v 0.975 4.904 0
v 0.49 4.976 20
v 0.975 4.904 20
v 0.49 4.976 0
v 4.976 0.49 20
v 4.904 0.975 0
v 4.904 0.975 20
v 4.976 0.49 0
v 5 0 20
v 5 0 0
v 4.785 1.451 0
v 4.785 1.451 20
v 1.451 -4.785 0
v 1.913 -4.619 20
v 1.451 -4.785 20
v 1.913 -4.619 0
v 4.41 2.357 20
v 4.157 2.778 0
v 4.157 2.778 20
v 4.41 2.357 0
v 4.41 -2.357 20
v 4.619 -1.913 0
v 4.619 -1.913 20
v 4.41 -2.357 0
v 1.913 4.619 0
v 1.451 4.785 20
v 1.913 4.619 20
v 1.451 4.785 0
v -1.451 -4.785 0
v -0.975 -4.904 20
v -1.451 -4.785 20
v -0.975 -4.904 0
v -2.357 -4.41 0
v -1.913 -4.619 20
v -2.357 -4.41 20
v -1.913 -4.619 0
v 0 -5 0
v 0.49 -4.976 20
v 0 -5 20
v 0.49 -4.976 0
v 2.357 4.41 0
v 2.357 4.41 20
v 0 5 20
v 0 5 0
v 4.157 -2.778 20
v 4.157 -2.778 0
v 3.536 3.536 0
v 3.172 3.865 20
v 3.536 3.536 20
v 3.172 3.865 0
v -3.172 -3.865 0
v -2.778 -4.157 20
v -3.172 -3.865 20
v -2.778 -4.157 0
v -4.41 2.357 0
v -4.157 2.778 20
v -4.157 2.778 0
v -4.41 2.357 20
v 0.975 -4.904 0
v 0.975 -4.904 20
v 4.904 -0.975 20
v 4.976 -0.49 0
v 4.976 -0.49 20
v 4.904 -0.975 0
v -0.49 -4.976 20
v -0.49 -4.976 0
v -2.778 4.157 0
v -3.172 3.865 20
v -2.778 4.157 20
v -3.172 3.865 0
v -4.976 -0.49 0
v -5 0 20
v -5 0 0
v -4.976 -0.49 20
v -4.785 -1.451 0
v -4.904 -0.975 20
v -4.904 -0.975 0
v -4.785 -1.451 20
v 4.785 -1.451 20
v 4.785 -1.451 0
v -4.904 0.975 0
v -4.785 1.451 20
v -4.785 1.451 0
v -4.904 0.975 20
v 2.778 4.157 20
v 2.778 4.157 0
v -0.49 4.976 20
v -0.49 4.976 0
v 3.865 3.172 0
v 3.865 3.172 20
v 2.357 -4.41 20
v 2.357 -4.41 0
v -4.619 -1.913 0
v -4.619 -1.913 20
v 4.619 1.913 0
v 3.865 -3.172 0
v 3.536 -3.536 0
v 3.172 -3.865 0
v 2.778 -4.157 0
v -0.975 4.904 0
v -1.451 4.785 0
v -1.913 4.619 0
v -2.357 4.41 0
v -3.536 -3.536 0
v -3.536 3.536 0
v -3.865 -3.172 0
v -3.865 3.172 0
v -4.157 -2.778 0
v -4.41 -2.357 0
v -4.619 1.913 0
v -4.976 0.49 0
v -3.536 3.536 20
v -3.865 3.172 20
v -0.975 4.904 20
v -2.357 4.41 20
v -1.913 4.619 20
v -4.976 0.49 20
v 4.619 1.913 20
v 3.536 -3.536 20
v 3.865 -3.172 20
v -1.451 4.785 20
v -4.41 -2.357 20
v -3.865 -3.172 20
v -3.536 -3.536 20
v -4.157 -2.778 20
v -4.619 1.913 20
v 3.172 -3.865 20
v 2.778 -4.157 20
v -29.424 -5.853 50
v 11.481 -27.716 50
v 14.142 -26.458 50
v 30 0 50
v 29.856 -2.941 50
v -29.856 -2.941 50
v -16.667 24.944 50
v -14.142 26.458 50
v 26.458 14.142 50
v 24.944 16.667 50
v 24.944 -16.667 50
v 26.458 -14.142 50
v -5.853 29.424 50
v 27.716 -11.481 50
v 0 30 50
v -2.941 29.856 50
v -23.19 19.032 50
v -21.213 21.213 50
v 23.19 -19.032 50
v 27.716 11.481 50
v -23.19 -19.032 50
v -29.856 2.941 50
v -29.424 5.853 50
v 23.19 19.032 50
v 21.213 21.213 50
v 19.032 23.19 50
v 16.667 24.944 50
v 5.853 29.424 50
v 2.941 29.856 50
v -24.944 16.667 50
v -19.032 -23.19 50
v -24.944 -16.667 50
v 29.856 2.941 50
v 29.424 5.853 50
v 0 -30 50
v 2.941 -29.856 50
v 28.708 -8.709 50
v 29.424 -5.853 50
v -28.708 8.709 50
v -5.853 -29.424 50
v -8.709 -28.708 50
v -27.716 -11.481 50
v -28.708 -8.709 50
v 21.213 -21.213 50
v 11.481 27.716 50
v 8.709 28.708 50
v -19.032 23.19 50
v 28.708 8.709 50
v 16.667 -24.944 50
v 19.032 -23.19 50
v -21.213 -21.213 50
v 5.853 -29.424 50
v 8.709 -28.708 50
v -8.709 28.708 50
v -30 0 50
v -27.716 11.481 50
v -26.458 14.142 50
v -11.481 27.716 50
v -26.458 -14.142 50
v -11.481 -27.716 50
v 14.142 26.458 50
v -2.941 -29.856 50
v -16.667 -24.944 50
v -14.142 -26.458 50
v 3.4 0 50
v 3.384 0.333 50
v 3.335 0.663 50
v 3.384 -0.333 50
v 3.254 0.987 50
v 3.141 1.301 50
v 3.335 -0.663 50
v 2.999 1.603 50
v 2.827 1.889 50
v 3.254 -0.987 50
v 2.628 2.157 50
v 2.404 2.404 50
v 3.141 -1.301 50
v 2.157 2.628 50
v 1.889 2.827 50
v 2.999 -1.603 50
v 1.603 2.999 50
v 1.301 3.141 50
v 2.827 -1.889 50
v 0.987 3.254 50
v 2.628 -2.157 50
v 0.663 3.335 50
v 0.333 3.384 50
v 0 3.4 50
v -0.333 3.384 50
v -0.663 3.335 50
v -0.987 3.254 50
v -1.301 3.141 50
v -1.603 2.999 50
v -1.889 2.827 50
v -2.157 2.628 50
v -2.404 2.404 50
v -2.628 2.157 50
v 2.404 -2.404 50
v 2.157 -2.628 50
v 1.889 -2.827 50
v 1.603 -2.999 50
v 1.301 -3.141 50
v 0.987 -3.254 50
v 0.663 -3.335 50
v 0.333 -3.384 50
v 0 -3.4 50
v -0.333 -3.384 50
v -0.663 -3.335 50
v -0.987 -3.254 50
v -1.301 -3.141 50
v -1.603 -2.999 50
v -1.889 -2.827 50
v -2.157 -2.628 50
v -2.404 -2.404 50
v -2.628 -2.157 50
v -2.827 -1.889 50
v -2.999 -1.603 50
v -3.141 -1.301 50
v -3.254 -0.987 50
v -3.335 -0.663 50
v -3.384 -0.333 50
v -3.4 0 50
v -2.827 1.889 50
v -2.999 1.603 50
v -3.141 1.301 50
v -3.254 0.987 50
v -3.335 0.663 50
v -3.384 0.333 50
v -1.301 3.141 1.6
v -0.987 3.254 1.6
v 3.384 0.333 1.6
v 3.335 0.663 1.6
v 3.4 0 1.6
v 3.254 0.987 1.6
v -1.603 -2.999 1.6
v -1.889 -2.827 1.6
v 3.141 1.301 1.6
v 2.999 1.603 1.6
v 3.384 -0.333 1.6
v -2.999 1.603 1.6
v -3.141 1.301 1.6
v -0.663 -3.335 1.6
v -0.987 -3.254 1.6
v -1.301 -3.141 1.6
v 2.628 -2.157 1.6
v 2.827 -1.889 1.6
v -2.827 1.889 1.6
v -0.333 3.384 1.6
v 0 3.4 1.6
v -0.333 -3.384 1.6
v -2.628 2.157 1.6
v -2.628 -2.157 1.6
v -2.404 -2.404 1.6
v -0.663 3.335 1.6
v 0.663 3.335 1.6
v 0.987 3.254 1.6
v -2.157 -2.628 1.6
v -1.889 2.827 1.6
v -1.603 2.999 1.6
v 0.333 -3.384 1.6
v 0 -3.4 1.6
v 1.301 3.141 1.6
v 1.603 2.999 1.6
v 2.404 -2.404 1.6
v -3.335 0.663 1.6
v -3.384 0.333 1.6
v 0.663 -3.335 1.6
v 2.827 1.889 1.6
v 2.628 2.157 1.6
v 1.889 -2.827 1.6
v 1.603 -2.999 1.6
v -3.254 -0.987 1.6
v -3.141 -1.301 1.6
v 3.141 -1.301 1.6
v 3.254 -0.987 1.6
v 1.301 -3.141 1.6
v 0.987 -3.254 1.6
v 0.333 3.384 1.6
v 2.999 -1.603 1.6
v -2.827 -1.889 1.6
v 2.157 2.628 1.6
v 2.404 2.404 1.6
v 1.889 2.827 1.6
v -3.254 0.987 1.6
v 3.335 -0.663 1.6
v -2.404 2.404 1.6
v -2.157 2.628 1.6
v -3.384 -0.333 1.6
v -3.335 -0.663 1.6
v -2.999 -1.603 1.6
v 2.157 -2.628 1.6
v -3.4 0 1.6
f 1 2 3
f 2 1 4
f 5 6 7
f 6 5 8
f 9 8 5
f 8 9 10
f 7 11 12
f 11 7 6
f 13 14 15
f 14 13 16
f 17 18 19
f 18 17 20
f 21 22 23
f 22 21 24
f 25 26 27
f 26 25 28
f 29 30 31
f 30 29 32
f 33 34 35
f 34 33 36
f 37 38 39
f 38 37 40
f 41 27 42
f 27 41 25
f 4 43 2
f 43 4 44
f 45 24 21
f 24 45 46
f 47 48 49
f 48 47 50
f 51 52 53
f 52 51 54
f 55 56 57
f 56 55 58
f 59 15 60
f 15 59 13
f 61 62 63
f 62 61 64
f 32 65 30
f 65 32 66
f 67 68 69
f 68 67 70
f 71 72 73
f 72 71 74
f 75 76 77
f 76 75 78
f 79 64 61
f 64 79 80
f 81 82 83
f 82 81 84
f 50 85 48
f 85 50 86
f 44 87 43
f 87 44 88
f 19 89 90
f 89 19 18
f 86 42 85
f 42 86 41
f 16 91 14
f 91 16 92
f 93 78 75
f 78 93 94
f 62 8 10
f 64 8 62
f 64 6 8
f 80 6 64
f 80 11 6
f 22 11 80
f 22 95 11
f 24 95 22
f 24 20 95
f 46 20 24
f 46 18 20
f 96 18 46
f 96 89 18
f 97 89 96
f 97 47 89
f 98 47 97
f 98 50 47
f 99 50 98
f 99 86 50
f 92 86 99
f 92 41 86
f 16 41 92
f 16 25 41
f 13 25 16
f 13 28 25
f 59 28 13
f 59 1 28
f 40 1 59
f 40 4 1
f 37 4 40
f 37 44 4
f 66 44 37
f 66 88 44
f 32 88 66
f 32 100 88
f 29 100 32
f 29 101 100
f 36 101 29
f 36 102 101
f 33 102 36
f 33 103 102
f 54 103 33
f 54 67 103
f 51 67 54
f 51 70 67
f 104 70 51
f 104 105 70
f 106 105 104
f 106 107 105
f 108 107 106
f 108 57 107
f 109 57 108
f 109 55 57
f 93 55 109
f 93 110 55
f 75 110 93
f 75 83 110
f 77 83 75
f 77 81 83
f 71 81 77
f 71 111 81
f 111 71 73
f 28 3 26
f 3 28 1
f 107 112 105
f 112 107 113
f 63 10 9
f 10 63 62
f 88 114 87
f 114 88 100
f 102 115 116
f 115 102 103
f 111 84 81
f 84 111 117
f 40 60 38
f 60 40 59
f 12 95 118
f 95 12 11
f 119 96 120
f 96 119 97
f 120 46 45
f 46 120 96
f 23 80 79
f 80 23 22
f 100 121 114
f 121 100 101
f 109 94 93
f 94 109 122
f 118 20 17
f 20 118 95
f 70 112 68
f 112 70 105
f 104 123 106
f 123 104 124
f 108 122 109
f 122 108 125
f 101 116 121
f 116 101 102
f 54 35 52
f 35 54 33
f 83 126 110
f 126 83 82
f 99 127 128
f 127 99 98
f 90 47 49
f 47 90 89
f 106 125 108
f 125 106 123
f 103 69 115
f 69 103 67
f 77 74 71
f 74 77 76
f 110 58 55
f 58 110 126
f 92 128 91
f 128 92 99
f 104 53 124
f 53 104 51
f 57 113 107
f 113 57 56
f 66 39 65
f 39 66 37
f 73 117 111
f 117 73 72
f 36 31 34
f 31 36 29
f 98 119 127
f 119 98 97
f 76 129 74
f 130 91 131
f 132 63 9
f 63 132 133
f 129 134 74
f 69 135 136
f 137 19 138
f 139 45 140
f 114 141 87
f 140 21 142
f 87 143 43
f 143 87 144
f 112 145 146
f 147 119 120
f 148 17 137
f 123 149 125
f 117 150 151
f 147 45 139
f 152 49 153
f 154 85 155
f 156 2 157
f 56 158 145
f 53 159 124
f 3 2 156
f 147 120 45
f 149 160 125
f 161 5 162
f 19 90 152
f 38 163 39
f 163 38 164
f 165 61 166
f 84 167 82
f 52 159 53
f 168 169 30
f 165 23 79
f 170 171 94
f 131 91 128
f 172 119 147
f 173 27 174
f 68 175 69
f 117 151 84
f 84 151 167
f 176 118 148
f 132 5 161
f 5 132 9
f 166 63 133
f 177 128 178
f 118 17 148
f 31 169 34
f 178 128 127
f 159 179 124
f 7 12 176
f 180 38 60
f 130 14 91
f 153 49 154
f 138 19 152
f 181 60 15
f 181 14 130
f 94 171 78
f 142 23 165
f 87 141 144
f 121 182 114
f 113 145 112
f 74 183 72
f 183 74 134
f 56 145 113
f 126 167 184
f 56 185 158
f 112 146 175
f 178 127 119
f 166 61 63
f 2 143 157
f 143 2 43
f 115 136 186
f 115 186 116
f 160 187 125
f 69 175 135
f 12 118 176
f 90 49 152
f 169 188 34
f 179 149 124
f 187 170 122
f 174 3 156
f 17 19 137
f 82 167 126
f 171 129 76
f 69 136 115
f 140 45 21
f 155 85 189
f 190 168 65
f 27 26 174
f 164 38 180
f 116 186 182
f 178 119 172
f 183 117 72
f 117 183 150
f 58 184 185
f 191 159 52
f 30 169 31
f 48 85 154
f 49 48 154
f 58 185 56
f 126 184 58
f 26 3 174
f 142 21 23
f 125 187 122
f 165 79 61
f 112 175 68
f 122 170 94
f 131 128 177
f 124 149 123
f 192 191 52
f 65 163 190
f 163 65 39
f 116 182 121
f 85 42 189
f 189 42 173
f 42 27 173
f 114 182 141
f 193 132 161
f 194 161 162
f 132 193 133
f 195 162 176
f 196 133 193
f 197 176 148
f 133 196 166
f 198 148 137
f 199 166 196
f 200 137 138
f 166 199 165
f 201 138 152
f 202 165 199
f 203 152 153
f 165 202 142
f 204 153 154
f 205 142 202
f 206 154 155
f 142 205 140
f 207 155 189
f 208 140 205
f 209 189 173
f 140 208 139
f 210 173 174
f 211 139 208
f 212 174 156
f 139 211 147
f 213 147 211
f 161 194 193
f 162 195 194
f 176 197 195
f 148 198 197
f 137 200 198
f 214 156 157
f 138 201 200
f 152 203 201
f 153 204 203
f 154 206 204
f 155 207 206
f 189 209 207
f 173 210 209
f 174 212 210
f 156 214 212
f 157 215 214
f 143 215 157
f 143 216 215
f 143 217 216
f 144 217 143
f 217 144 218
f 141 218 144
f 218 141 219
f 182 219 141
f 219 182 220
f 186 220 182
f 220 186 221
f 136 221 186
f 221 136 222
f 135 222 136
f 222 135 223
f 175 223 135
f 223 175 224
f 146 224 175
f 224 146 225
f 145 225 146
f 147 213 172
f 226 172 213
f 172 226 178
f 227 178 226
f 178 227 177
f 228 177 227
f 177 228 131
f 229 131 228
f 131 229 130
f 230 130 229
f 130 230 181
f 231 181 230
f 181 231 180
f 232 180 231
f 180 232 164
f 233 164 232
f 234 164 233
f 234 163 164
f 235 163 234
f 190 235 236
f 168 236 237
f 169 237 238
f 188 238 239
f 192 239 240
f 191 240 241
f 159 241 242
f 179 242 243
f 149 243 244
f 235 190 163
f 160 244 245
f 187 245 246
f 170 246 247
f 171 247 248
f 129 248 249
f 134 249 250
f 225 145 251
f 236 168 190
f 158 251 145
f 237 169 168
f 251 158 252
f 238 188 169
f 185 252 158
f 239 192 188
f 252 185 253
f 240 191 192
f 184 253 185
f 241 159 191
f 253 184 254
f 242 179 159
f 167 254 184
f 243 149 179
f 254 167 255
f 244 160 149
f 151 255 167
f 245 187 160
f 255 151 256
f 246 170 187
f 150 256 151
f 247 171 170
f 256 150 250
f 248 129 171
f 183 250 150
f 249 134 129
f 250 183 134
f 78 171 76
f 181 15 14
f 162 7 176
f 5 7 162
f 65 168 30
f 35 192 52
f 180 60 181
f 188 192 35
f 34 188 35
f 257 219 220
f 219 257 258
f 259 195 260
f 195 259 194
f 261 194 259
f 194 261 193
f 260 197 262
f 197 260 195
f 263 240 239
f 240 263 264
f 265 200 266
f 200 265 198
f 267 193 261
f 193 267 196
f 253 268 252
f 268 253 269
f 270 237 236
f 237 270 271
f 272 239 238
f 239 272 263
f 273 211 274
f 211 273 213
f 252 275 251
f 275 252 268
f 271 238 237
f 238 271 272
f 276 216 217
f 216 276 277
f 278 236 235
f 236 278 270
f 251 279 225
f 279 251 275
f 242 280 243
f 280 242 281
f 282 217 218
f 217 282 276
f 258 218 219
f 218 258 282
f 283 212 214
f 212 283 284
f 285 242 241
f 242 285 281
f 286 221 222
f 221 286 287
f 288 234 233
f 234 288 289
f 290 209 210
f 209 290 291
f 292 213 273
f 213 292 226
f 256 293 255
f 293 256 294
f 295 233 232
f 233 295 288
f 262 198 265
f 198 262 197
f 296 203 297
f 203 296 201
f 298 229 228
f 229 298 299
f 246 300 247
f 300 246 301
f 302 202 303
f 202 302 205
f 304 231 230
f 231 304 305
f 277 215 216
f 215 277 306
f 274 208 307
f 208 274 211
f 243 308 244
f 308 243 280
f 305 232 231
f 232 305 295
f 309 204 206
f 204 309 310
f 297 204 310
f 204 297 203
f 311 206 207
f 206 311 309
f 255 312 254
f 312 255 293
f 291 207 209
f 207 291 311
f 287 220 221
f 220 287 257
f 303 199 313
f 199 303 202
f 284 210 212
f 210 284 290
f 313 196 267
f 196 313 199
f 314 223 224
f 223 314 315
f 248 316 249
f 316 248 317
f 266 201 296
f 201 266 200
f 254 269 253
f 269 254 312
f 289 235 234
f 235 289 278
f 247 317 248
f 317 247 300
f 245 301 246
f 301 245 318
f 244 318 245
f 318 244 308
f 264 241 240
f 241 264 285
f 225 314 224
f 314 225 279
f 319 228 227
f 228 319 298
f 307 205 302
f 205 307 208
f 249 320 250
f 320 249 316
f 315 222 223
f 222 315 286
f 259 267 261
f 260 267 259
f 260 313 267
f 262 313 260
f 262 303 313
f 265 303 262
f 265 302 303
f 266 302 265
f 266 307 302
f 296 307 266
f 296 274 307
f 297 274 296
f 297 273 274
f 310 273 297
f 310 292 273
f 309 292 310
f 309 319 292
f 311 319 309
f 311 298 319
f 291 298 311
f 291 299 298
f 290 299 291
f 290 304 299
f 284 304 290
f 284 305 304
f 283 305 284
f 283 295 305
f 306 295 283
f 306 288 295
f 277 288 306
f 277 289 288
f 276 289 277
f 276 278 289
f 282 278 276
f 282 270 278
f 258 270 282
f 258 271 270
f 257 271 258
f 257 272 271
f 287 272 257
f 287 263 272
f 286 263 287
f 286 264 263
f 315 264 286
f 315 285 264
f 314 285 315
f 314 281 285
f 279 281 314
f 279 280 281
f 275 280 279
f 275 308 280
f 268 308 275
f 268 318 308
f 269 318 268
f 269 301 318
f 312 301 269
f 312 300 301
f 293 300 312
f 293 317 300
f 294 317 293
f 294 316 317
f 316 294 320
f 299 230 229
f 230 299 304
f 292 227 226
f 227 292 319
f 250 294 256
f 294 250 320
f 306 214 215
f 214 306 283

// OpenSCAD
// Small lab funnel – printed upright, wide opening at top, straight through bore.
// All dimensions in millimetres.

// ---- Named dimensions (measured with calipers) ----
spout_od   = 10.0;   // spout outer diameter
spout_h    = 20.0;   // spout height (z = 0 to z = 20)
cone_od    = 60.0;   // cone outer diameter at the rim (z = 50)
cone_h     = 30.0;   // cone height (z = 20 to z = 50)
wall       = 1.6;    // uniform wall thickness
bore_d     = spout_od - 2*wall;   // 6.8 mm straight bore
total_h    = spout_h + cone_h;    // 50 mm overall height

$fn = 64;            // smooth round holes / rims

// ---- Outer solid: straight spout + widening cone ----
module outer() { union() {
    // Straight spout, z = 0 to z = 20
    translate([0, 0, 0])
        cylinder(h = spout_h, d = spout_od, center = false);

    // Cone, z = 20 to z = 50 (10 mm OD -> 60 mm OD)
    translate([0, 0, spout_h])
        cylinder(h = cone_h, d1 = spout_od, d2 = cone_od, center = false);
} }

// ---- Bore: straight 6.8 mm tube, closed at the bottom by a 1.6 mm base plate,
//      open at the top so liquid runs straight through.
//      Extended 1 mm past the top face so the cut is clean (no coplanar faces). ----
module bore() { translate([0, 0, wall])
    cylinder(h = (total_h - wall) + 1, d = bore_d, center = false); }

// ---- Final funnel: outer solid minus the through-bore ----
difference() {
    outer();
    bore();
}
